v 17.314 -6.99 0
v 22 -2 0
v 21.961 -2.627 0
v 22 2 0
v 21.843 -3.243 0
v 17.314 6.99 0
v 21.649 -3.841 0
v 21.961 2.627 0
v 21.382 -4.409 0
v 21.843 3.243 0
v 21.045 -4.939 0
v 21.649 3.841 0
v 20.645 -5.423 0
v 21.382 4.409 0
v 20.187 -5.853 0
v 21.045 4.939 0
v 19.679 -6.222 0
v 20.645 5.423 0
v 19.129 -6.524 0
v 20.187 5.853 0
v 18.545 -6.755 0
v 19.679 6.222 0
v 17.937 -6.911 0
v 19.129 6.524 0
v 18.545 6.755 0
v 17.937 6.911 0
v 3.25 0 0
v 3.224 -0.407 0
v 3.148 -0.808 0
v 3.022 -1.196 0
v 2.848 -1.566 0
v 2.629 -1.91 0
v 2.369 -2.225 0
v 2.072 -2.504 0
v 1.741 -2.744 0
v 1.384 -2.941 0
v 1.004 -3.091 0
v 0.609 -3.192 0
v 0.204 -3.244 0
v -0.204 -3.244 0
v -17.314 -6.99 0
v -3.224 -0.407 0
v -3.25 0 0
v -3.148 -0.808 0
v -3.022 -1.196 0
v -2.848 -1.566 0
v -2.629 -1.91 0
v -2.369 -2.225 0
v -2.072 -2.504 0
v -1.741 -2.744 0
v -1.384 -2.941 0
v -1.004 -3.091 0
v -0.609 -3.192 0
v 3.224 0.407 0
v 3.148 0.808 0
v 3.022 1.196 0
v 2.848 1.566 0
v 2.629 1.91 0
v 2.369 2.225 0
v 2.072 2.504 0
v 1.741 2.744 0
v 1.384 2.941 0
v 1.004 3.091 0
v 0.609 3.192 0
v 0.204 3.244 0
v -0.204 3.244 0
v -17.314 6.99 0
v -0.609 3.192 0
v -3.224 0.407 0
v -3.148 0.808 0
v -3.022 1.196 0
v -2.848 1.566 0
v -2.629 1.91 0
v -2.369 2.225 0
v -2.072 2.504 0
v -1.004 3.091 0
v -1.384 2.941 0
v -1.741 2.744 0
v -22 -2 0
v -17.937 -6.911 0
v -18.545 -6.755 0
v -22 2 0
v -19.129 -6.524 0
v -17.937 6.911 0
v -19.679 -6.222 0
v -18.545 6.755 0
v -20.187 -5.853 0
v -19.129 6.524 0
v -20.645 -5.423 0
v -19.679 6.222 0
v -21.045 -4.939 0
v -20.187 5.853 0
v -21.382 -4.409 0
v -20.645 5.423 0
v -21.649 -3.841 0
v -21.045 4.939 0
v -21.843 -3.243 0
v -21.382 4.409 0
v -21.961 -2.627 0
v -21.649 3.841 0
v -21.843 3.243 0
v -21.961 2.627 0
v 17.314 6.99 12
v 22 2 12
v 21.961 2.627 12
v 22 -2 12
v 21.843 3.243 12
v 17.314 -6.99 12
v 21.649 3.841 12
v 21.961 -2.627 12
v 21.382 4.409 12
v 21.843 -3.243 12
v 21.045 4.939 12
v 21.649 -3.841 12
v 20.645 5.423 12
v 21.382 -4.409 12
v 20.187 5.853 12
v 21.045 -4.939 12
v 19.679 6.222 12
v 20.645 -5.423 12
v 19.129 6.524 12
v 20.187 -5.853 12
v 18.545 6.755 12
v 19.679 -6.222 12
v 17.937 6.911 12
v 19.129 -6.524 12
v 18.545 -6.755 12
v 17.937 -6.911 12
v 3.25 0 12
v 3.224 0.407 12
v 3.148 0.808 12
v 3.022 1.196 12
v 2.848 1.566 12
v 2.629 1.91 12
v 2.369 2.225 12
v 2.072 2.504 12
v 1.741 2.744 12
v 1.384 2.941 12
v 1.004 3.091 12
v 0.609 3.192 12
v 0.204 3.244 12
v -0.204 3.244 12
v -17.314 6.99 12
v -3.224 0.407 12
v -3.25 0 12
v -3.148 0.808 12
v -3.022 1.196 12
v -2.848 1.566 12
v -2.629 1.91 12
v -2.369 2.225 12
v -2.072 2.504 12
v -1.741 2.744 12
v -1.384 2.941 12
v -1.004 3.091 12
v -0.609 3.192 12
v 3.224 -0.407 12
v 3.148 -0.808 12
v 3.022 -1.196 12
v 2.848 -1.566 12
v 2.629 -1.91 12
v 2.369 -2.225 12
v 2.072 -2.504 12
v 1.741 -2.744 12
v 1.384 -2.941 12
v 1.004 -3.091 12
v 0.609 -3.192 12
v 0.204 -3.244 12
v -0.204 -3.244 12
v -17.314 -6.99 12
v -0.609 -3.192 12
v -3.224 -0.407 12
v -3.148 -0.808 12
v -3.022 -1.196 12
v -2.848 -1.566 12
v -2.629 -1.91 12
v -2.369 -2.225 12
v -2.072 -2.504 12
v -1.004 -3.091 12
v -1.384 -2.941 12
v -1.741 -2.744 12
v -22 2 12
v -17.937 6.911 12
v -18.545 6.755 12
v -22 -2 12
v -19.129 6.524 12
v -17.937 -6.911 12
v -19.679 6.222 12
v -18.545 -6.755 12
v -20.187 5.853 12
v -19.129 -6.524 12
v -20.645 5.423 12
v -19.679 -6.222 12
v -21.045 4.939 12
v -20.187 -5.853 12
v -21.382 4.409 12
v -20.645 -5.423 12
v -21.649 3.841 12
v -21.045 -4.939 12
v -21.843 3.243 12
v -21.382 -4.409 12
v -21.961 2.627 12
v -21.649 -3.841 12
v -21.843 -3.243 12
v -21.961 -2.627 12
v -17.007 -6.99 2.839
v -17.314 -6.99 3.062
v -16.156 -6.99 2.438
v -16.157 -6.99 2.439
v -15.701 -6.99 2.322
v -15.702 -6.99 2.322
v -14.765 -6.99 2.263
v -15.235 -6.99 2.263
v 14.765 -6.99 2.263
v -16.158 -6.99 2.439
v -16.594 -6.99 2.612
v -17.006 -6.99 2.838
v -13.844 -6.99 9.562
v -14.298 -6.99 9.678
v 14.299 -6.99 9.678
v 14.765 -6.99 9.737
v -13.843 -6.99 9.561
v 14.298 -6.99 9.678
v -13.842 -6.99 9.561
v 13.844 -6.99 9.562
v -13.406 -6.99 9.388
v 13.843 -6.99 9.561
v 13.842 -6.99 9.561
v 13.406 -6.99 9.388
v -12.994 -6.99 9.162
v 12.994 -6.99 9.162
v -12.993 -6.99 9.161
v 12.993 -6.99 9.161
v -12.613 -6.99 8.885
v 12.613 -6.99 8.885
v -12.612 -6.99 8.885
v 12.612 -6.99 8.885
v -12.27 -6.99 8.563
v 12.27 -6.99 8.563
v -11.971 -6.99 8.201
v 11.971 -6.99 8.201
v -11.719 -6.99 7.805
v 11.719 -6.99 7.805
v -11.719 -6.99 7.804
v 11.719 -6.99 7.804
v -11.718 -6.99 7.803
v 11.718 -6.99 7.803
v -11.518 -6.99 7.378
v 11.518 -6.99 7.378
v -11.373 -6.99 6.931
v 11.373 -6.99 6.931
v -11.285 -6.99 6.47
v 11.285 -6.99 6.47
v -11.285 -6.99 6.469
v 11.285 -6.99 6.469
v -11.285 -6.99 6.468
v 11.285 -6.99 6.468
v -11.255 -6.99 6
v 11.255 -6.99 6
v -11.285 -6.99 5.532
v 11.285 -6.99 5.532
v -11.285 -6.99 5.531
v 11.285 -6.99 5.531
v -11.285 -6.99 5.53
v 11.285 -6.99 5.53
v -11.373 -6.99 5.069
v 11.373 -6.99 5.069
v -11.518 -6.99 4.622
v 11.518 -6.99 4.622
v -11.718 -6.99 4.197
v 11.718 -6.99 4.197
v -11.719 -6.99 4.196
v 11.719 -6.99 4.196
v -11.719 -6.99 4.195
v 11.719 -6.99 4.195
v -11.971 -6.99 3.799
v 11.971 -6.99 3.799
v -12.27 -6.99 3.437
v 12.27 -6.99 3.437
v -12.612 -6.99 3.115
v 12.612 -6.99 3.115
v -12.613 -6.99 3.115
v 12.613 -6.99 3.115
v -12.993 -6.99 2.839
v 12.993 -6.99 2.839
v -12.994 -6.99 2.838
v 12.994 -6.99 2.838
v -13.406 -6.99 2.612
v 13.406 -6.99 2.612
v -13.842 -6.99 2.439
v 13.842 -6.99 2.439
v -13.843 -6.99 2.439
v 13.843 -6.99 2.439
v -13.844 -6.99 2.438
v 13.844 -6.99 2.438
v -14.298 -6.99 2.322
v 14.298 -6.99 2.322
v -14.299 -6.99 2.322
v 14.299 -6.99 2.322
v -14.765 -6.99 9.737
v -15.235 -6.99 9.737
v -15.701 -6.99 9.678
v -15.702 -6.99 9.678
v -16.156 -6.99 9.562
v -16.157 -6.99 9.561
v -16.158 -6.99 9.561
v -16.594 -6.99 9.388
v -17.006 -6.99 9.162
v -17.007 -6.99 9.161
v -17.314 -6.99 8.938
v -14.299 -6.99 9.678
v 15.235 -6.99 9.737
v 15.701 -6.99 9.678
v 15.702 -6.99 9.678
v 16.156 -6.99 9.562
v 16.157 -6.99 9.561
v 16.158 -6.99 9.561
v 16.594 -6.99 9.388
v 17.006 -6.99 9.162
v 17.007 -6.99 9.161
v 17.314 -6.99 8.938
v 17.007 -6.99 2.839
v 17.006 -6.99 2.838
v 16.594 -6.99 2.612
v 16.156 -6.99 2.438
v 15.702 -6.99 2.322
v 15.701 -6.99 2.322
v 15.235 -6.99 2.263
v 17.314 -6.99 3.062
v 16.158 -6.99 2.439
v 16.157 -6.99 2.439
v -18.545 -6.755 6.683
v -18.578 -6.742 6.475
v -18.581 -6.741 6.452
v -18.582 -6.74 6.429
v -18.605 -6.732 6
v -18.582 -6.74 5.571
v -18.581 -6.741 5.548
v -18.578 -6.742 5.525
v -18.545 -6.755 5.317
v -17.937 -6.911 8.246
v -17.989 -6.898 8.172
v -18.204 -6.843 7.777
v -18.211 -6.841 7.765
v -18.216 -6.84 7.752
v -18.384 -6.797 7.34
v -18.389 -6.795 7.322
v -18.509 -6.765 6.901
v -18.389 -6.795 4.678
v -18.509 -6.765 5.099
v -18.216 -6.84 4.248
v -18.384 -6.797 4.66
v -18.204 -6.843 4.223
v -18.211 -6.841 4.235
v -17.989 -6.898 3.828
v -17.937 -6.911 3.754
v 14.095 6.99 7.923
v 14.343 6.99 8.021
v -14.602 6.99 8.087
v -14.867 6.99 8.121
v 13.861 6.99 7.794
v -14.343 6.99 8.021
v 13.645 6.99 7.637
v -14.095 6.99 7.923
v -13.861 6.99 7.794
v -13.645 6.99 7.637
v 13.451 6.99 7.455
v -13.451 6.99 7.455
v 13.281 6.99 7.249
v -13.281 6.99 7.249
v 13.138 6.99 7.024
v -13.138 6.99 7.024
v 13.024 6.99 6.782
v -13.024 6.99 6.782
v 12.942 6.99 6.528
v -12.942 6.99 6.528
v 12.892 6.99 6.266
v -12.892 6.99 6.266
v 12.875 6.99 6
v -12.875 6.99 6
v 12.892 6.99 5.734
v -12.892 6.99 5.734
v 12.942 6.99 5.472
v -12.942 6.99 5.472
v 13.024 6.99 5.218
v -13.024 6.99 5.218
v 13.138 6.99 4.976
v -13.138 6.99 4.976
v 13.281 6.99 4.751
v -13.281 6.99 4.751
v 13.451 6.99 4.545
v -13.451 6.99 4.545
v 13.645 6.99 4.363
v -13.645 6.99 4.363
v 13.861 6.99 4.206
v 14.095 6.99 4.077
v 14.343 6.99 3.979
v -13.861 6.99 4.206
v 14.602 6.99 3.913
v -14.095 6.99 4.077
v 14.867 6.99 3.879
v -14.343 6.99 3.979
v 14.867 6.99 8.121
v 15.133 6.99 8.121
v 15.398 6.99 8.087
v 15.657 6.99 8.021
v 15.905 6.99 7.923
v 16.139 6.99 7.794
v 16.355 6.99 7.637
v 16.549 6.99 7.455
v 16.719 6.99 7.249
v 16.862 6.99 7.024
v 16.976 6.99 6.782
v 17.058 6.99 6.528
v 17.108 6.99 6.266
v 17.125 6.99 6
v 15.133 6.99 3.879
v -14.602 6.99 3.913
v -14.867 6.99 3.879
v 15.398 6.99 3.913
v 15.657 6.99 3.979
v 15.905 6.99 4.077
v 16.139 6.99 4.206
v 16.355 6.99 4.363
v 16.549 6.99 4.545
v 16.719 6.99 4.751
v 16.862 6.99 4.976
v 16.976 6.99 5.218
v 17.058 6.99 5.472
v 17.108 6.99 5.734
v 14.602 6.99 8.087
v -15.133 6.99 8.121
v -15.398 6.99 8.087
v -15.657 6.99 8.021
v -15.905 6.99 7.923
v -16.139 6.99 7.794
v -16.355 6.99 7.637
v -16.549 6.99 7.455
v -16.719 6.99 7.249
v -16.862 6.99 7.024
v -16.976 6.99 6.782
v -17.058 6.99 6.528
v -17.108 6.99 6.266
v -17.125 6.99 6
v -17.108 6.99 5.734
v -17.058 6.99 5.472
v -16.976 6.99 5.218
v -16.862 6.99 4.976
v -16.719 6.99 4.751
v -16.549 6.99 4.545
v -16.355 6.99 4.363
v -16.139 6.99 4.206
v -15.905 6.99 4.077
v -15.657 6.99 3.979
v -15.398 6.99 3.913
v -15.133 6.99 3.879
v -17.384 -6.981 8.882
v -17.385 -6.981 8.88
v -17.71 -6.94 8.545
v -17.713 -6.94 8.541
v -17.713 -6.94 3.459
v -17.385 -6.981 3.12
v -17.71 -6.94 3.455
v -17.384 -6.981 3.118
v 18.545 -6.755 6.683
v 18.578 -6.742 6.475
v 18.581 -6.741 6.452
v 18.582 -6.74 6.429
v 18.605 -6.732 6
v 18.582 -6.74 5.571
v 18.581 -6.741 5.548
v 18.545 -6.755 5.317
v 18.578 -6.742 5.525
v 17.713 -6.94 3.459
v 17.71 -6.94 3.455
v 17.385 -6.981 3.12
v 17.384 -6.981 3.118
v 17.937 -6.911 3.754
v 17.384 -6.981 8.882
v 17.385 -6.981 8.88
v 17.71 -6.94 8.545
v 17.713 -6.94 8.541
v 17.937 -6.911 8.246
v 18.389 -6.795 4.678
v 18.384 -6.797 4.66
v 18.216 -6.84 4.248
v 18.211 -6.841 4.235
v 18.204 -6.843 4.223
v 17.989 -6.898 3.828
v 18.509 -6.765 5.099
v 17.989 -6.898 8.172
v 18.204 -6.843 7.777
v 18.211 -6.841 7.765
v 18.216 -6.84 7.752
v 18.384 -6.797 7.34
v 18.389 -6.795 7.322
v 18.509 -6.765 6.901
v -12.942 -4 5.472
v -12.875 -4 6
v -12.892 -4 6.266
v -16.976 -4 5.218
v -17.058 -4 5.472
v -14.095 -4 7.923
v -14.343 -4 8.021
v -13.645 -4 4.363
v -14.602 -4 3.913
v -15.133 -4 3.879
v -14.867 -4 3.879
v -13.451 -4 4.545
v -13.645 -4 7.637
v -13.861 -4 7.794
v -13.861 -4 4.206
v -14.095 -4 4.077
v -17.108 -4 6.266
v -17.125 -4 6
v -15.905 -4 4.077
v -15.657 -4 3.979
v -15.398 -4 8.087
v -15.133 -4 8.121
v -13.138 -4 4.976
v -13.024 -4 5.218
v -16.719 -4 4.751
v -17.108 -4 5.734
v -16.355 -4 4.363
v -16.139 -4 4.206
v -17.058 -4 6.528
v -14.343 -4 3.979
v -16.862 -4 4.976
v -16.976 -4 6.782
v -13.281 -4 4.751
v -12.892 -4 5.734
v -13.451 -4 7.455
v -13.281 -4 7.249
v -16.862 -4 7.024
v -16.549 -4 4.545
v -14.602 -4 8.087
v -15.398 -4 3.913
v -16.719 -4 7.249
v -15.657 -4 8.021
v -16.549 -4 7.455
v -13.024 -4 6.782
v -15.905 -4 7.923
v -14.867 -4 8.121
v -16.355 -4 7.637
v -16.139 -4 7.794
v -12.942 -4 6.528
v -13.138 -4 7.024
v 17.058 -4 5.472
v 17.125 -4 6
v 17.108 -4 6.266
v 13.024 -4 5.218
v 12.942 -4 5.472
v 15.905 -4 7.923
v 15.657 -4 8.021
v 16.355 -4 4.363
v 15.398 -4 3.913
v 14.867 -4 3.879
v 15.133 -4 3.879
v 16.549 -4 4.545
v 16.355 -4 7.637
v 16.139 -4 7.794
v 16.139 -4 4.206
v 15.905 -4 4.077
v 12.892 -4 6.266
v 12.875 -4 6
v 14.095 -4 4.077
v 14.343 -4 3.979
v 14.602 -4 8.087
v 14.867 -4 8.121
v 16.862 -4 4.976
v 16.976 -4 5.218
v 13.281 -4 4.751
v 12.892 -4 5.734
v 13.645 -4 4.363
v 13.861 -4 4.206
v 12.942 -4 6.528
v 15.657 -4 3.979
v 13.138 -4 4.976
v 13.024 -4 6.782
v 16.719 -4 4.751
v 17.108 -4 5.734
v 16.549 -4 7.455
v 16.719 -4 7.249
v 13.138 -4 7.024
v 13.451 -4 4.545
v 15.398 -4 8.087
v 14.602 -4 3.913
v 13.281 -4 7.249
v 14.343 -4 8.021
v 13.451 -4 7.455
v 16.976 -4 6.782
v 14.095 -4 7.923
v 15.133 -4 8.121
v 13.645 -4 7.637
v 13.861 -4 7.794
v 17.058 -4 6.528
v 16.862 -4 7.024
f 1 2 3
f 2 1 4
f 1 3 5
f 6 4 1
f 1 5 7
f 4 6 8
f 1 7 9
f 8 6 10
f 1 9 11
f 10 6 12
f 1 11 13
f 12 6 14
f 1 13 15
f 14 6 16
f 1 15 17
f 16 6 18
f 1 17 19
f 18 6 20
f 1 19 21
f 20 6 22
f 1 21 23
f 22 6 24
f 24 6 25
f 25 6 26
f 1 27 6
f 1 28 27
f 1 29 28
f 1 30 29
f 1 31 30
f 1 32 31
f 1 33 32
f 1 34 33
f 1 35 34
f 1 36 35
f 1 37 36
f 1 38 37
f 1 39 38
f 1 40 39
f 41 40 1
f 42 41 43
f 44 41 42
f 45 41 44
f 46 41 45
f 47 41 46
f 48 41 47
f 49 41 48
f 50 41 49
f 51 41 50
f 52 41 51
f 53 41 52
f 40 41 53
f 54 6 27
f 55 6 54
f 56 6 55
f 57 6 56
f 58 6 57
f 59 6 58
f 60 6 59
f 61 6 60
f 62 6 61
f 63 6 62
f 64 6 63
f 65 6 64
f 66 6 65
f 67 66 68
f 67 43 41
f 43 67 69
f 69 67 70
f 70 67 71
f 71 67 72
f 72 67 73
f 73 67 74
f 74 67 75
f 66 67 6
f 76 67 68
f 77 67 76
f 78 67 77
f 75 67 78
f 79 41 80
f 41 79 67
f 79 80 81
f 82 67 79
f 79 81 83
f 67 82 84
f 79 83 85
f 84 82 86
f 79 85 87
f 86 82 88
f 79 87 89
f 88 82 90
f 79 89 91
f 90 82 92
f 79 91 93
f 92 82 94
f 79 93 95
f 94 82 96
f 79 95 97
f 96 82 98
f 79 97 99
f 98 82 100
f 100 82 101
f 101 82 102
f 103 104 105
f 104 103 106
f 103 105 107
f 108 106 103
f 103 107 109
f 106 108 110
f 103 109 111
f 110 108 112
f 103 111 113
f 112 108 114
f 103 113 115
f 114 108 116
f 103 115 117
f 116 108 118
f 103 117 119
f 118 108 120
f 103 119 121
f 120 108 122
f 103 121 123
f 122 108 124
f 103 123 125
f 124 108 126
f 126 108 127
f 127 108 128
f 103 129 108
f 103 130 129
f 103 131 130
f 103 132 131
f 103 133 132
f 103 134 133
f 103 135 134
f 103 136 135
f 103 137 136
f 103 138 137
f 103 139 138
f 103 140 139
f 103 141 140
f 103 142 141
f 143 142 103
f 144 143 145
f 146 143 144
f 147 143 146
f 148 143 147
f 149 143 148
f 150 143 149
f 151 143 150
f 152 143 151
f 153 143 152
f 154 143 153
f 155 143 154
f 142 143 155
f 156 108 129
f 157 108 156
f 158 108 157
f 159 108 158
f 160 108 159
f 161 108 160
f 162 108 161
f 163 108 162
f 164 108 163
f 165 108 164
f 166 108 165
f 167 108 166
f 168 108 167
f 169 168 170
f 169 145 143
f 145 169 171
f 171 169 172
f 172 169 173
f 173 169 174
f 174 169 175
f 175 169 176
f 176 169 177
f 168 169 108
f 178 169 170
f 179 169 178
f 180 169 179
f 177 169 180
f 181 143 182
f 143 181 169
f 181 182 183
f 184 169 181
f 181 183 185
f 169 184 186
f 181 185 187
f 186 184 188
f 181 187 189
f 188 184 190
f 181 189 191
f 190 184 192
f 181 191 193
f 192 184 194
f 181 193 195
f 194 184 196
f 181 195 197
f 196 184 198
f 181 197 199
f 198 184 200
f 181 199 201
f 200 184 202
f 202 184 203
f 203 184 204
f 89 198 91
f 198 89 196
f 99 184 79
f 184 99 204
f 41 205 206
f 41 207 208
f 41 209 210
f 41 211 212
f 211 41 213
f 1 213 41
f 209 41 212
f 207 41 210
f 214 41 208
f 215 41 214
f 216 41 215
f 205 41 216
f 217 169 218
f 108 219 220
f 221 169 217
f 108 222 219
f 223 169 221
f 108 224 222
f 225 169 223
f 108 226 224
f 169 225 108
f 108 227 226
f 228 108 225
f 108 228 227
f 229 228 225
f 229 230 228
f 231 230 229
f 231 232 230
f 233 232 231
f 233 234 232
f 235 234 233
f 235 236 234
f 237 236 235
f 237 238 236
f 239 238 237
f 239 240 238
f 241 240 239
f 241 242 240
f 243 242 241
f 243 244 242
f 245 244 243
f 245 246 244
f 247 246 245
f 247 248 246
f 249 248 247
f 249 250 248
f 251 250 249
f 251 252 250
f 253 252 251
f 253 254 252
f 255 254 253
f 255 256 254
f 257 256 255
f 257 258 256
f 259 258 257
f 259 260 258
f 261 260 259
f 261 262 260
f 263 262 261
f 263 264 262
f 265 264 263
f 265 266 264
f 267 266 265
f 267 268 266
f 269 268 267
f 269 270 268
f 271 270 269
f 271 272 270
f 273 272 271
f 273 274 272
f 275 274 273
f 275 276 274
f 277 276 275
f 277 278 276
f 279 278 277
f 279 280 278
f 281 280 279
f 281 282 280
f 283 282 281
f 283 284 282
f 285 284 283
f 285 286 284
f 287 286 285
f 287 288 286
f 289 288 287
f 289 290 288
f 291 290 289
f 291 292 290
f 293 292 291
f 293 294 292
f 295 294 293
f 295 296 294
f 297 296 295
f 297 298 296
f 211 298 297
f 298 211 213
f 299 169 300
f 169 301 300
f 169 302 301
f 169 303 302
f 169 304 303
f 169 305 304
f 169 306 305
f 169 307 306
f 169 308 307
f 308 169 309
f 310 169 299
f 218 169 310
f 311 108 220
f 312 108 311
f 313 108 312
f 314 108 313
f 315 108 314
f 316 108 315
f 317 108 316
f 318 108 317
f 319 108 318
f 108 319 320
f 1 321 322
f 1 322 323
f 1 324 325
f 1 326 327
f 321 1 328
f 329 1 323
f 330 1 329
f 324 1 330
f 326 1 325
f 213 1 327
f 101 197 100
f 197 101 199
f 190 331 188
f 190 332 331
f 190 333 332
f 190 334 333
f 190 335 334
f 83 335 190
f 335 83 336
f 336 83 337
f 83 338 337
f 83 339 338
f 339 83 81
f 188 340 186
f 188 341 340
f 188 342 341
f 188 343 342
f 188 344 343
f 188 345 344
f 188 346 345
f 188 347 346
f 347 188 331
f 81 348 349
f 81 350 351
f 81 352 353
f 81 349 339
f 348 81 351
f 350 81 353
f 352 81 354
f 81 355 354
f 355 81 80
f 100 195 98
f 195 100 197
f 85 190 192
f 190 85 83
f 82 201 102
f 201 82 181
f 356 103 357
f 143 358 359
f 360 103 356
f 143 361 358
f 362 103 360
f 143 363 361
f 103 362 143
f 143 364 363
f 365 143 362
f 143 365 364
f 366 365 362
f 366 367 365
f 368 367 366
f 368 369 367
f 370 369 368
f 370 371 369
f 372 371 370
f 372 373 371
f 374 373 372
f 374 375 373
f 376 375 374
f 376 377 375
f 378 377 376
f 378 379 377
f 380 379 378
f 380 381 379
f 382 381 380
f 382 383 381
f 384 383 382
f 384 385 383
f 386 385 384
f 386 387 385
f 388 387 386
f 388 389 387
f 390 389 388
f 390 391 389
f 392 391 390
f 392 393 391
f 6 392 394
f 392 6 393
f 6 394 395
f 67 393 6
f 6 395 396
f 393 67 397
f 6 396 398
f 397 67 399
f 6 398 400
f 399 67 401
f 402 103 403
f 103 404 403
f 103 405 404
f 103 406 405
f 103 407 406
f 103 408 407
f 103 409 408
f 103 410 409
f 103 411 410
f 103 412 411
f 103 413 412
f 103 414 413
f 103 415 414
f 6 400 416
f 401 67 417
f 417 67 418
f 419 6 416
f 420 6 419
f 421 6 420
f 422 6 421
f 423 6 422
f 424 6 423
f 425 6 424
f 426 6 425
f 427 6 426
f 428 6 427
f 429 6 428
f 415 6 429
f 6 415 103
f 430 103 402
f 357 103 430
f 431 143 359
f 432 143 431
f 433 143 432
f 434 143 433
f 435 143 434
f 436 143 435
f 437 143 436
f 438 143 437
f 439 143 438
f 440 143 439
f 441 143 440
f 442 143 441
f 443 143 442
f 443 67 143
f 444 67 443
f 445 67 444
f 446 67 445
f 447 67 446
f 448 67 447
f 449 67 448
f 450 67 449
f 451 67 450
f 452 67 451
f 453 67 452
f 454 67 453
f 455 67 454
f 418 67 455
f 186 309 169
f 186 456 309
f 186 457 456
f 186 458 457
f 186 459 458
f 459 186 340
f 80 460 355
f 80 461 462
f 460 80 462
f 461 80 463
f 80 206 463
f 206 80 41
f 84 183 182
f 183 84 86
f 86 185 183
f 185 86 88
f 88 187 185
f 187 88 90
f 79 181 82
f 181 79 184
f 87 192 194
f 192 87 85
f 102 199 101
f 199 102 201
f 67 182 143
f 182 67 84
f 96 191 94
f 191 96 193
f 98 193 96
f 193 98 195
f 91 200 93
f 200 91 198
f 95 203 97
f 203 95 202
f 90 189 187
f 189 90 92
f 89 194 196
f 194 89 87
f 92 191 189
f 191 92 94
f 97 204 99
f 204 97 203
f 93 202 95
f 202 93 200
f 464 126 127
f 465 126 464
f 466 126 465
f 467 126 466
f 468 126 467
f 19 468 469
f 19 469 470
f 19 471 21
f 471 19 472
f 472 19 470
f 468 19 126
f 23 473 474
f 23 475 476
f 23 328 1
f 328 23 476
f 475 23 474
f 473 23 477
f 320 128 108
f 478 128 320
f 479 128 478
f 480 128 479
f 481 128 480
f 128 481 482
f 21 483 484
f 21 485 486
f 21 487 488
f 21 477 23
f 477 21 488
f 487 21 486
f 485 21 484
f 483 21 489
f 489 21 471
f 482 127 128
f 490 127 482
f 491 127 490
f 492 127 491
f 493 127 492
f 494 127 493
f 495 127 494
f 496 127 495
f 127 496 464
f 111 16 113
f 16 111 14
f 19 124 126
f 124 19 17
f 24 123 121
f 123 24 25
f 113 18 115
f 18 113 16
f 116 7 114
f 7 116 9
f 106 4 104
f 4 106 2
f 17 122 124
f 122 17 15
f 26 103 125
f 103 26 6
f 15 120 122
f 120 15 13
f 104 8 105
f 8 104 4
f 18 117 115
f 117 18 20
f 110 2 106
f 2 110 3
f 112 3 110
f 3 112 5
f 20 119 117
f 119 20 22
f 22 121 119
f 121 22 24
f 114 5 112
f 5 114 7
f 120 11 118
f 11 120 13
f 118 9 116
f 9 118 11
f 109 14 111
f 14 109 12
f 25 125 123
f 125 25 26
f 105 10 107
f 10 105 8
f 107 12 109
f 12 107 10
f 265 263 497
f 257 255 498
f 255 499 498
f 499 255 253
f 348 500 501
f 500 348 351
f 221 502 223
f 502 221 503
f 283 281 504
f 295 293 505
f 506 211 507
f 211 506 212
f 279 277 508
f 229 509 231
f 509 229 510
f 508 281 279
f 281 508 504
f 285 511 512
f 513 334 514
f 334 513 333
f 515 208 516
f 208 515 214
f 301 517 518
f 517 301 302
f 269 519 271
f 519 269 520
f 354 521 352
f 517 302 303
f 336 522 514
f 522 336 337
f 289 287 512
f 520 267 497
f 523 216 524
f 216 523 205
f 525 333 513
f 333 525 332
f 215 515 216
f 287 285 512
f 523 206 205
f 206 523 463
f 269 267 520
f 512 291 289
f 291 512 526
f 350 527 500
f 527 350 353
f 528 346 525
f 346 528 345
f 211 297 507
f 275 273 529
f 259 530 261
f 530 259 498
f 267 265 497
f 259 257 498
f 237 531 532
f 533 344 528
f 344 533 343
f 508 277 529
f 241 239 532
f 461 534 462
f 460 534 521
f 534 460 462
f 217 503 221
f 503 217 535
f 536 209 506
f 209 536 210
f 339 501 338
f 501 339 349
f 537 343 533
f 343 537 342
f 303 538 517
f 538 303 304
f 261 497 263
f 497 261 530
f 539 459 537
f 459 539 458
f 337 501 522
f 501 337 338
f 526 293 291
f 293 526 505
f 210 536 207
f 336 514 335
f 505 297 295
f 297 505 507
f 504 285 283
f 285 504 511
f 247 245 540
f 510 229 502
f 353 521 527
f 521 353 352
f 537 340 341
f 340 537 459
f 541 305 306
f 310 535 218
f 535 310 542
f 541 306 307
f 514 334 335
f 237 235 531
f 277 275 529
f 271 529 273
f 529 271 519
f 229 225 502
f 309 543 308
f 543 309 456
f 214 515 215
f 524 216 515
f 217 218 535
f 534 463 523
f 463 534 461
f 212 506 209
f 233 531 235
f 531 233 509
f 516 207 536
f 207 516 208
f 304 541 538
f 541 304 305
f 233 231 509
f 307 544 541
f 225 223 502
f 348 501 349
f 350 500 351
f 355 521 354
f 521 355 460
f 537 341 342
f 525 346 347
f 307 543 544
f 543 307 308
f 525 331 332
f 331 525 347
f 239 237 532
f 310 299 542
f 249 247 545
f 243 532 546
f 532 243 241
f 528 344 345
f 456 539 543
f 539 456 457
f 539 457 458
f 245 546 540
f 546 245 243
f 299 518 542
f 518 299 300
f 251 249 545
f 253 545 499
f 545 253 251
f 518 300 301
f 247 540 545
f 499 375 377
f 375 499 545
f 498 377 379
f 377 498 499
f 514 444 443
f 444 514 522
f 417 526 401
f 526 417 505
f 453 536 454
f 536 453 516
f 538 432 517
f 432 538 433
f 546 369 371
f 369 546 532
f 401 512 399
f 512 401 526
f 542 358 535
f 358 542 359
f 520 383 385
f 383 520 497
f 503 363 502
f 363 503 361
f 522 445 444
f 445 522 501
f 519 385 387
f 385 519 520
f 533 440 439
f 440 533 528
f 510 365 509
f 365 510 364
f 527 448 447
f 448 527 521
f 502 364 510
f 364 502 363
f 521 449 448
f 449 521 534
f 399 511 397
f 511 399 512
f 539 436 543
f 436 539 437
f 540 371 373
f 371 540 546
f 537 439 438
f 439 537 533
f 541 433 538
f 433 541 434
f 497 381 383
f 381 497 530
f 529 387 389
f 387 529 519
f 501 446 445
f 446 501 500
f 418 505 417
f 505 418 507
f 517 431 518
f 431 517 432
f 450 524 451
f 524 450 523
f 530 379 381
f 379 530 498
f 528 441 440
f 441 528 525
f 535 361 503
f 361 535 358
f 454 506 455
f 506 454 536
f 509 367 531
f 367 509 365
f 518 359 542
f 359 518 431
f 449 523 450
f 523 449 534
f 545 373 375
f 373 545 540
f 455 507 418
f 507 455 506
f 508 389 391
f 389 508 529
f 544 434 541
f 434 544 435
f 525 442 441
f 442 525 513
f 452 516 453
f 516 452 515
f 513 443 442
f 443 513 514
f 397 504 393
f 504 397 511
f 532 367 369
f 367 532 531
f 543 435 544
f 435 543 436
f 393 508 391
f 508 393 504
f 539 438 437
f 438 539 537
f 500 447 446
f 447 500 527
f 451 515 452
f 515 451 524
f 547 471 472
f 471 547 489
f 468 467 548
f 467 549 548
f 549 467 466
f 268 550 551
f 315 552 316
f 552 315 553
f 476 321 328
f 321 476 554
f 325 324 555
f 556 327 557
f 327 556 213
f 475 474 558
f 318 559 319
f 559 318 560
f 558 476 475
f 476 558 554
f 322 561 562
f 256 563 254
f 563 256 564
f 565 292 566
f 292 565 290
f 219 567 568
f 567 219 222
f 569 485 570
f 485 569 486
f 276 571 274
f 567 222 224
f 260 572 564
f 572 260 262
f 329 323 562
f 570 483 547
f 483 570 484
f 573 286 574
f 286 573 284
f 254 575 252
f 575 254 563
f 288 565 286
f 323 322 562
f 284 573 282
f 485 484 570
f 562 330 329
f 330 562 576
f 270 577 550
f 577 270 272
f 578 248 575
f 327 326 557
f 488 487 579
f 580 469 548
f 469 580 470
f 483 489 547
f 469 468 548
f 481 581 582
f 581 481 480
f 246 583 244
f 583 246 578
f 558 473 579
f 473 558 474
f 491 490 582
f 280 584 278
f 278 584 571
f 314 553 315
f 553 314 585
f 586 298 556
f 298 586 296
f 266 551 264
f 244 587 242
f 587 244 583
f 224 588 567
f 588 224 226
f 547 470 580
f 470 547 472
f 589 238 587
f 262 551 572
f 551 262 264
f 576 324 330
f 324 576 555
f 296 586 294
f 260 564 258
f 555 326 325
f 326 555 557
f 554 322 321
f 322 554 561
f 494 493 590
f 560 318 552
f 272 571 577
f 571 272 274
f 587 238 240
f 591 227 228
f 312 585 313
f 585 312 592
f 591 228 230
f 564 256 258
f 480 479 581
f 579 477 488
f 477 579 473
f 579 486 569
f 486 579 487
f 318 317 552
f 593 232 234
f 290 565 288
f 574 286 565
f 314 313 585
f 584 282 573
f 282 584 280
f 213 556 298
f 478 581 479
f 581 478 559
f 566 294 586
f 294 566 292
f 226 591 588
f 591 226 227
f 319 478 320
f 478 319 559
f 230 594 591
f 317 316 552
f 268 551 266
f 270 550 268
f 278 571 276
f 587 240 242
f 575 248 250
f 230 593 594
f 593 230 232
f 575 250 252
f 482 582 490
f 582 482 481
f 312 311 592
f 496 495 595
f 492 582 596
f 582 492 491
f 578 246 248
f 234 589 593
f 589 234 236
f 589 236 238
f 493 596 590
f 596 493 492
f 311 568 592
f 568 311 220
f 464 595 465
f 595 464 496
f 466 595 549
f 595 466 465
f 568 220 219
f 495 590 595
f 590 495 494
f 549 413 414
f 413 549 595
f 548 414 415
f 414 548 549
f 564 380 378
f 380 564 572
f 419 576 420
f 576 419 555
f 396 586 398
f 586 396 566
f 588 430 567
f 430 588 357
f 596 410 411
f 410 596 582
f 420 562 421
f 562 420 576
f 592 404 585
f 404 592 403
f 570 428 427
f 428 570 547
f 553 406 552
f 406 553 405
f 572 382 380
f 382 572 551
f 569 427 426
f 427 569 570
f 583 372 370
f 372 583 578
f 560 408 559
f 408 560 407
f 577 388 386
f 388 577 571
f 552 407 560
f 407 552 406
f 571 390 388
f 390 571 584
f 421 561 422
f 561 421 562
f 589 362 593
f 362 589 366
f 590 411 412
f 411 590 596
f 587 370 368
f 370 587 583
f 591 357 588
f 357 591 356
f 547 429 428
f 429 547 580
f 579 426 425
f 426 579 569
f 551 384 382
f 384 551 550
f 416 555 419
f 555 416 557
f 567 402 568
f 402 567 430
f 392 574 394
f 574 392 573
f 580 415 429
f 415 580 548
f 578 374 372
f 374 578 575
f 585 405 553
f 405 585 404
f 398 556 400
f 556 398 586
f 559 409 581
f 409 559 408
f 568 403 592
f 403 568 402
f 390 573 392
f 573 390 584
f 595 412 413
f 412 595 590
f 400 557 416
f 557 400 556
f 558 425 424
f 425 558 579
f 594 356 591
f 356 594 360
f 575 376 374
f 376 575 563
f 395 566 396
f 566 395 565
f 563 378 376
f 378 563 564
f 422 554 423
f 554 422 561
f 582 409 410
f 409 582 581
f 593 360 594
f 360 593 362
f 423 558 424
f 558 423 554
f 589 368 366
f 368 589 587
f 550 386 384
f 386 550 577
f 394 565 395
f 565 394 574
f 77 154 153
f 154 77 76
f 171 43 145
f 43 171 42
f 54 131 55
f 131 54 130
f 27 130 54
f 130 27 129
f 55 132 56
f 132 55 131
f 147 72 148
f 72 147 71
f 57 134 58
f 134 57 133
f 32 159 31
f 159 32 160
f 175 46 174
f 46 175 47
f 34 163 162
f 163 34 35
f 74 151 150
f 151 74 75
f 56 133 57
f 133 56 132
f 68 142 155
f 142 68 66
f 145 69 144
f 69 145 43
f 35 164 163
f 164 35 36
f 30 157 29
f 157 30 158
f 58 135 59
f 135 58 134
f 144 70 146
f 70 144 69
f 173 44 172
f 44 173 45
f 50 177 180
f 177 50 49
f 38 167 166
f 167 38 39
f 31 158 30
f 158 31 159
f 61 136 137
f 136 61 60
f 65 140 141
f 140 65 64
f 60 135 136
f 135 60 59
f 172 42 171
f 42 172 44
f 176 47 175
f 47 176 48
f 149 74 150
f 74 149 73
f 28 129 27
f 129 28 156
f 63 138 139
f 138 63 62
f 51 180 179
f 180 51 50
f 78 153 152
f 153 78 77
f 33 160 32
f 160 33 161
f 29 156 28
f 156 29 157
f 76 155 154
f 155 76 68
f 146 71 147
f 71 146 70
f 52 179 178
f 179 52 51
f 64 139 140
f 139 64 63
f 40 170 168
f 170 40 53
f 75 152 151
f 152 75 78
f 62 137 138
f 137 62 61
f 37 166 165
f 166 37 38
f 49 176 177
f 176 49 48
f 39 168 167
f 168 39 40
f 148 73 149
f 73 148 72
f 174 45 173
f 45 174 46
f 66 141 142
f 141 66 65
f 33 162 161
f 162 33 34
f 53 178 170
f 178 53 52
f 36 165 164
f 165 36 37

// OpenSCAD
$fn = 50;


difference() {
	union() {
		cylinder(h = 12, r = 7.0000000000);
		translate(v = [-7.5000000000, 0.0000000000, 0]) {
			hull() {
				translate(v = [-9.5000000000, 2.0000000000, 0]) {
					cylinder(h = 12, r = 5);
				}
				translate(v = [9.5000000000, 2.0000000000, 0]) {
					cylinder(h = 12, r = 5);
				}
				translate(v = [-9.5000000000, -2.0000000000, 0]) {
					cylinder(h = 12, r = 5);
				}
				translate(v = [9.5000000000, -2.0000000000, 0]) {
					cylinder(h = 12, r = 5);
				}
			}
		}
		translate(v = [-7.5000000000, 0.0000000000, 0]) {
			hull() {
				translate(v = [-9.5000000000, 2.0000000000, 0]) {
					cylinder(h = 12, r = 5);
				}
				translate(v = [9.5000000000, 2.0000000000, 0]) {
					cylinder(h = 12, r = 5);
				}
				translate(v = [-9.5000000000, -2.0000000000, 0]) {
					cylinder(h = 12, r = 5);
				}
				translate(v = [9.5000000000, -2.0000000000, 0]) {
					cylinder(h = 12, r = 5);
				}
			}
		}
		translate(v = [7.5000000000, 0.0000000000, 0]) {
			hull() {
				translate(v = [-9.5000000000, 2.0000000000, 0]) {
					cylinder(h = 12, r = 5);
				}
				translate(v = [9.5000000000, 2.0000000000, 0]) {
					cylinder(h = 12, r = 5);
				}
				translate(v = [-9.5000000000, -2.0000000000, 0]) {
					cylinder(h = 12, r = 5);
				}
				translate(v = [9.5000000000, -2.0000000000, 0]) {
					cylinder(h = 12, r = 5);
				}
			}
		}
		translate(v = [7.5000000000, 0.0000000000, 0]) {
			hull() {
				translate(v = [-9.5000000000, 2.0000000000, 0]) {
					cylinder(h = 12, r = 5);
				}
				translate(v = [9.5000000000, 2.0000000000, 0]) {
					cylinder(h = 12, r = 5);
				}
				translate(v = [-9.5000000000, -2.0000000000, 0]) {
					cylinder(h = 12, r = 5);
				}
				translate(v = [9.5000000000, -2.0000000000, 0]) {
					cylinder(h = 12, r = 5);
				}
			}
		}
	}
	union() {
		translate(v = [-15.0000000000, -7.0000000000, 6.0000000000]) {
			rotate(a = [90, 0, 0]) {
				difference() {
					union() {
						#translate(v = [0, 0, -14.0000000000]) {
							cylinder(h = 14, r = 2.0000000000);
						}
						#translate(v = [0, 0, -3]) {
							cylinder(h = 3, r1 = 2.1250000000, r2 = 3.7500000000);
						}
						#translate(v = [0, 0, -14.0000000000]) {
							cylinder(h = 14, r = 2.1250000000);
						}
						#translate(v = [0, 0, -14.0000000000]) {
							cylinder(h = 14, r = 2.0000000000);
						}
					}
					union();
				}
			}
		}
		translate(v = [15.0000000000, -7.0000000000, 6.0000000000]) {
			rotate(a = [90, 0, 0]) {
				difference() {
					union() {
						#translate(v = [0, 0, -14.0000000000]) {
							cylinder(h = 14, r = 2.0000000000);
						}
						#translate(v = [0, 0, -3]) {
							cylinder(h = 3, r1 = 2.1250000000, r2 = 3.7500000000);
						}
						#translate(v = [0, 0, -14.0000000000]) {
							cylinder(h = 14, r = 2.1250000000);
						}
						#translate(v = [0, 0, -14.0000000000]) {
							cylinder(h = 14, r = 2.0000000000);
						}
					}
					union();
				}
			}
		}
		translate(v = [0, 0, -100]) {
			cylinder(h = 200, r = 3.2500000000);
		}
		translate(v = [0, 0, -100]) {
			cylinder(h = 200, r = 1.8000000000);
		}
	}
}
